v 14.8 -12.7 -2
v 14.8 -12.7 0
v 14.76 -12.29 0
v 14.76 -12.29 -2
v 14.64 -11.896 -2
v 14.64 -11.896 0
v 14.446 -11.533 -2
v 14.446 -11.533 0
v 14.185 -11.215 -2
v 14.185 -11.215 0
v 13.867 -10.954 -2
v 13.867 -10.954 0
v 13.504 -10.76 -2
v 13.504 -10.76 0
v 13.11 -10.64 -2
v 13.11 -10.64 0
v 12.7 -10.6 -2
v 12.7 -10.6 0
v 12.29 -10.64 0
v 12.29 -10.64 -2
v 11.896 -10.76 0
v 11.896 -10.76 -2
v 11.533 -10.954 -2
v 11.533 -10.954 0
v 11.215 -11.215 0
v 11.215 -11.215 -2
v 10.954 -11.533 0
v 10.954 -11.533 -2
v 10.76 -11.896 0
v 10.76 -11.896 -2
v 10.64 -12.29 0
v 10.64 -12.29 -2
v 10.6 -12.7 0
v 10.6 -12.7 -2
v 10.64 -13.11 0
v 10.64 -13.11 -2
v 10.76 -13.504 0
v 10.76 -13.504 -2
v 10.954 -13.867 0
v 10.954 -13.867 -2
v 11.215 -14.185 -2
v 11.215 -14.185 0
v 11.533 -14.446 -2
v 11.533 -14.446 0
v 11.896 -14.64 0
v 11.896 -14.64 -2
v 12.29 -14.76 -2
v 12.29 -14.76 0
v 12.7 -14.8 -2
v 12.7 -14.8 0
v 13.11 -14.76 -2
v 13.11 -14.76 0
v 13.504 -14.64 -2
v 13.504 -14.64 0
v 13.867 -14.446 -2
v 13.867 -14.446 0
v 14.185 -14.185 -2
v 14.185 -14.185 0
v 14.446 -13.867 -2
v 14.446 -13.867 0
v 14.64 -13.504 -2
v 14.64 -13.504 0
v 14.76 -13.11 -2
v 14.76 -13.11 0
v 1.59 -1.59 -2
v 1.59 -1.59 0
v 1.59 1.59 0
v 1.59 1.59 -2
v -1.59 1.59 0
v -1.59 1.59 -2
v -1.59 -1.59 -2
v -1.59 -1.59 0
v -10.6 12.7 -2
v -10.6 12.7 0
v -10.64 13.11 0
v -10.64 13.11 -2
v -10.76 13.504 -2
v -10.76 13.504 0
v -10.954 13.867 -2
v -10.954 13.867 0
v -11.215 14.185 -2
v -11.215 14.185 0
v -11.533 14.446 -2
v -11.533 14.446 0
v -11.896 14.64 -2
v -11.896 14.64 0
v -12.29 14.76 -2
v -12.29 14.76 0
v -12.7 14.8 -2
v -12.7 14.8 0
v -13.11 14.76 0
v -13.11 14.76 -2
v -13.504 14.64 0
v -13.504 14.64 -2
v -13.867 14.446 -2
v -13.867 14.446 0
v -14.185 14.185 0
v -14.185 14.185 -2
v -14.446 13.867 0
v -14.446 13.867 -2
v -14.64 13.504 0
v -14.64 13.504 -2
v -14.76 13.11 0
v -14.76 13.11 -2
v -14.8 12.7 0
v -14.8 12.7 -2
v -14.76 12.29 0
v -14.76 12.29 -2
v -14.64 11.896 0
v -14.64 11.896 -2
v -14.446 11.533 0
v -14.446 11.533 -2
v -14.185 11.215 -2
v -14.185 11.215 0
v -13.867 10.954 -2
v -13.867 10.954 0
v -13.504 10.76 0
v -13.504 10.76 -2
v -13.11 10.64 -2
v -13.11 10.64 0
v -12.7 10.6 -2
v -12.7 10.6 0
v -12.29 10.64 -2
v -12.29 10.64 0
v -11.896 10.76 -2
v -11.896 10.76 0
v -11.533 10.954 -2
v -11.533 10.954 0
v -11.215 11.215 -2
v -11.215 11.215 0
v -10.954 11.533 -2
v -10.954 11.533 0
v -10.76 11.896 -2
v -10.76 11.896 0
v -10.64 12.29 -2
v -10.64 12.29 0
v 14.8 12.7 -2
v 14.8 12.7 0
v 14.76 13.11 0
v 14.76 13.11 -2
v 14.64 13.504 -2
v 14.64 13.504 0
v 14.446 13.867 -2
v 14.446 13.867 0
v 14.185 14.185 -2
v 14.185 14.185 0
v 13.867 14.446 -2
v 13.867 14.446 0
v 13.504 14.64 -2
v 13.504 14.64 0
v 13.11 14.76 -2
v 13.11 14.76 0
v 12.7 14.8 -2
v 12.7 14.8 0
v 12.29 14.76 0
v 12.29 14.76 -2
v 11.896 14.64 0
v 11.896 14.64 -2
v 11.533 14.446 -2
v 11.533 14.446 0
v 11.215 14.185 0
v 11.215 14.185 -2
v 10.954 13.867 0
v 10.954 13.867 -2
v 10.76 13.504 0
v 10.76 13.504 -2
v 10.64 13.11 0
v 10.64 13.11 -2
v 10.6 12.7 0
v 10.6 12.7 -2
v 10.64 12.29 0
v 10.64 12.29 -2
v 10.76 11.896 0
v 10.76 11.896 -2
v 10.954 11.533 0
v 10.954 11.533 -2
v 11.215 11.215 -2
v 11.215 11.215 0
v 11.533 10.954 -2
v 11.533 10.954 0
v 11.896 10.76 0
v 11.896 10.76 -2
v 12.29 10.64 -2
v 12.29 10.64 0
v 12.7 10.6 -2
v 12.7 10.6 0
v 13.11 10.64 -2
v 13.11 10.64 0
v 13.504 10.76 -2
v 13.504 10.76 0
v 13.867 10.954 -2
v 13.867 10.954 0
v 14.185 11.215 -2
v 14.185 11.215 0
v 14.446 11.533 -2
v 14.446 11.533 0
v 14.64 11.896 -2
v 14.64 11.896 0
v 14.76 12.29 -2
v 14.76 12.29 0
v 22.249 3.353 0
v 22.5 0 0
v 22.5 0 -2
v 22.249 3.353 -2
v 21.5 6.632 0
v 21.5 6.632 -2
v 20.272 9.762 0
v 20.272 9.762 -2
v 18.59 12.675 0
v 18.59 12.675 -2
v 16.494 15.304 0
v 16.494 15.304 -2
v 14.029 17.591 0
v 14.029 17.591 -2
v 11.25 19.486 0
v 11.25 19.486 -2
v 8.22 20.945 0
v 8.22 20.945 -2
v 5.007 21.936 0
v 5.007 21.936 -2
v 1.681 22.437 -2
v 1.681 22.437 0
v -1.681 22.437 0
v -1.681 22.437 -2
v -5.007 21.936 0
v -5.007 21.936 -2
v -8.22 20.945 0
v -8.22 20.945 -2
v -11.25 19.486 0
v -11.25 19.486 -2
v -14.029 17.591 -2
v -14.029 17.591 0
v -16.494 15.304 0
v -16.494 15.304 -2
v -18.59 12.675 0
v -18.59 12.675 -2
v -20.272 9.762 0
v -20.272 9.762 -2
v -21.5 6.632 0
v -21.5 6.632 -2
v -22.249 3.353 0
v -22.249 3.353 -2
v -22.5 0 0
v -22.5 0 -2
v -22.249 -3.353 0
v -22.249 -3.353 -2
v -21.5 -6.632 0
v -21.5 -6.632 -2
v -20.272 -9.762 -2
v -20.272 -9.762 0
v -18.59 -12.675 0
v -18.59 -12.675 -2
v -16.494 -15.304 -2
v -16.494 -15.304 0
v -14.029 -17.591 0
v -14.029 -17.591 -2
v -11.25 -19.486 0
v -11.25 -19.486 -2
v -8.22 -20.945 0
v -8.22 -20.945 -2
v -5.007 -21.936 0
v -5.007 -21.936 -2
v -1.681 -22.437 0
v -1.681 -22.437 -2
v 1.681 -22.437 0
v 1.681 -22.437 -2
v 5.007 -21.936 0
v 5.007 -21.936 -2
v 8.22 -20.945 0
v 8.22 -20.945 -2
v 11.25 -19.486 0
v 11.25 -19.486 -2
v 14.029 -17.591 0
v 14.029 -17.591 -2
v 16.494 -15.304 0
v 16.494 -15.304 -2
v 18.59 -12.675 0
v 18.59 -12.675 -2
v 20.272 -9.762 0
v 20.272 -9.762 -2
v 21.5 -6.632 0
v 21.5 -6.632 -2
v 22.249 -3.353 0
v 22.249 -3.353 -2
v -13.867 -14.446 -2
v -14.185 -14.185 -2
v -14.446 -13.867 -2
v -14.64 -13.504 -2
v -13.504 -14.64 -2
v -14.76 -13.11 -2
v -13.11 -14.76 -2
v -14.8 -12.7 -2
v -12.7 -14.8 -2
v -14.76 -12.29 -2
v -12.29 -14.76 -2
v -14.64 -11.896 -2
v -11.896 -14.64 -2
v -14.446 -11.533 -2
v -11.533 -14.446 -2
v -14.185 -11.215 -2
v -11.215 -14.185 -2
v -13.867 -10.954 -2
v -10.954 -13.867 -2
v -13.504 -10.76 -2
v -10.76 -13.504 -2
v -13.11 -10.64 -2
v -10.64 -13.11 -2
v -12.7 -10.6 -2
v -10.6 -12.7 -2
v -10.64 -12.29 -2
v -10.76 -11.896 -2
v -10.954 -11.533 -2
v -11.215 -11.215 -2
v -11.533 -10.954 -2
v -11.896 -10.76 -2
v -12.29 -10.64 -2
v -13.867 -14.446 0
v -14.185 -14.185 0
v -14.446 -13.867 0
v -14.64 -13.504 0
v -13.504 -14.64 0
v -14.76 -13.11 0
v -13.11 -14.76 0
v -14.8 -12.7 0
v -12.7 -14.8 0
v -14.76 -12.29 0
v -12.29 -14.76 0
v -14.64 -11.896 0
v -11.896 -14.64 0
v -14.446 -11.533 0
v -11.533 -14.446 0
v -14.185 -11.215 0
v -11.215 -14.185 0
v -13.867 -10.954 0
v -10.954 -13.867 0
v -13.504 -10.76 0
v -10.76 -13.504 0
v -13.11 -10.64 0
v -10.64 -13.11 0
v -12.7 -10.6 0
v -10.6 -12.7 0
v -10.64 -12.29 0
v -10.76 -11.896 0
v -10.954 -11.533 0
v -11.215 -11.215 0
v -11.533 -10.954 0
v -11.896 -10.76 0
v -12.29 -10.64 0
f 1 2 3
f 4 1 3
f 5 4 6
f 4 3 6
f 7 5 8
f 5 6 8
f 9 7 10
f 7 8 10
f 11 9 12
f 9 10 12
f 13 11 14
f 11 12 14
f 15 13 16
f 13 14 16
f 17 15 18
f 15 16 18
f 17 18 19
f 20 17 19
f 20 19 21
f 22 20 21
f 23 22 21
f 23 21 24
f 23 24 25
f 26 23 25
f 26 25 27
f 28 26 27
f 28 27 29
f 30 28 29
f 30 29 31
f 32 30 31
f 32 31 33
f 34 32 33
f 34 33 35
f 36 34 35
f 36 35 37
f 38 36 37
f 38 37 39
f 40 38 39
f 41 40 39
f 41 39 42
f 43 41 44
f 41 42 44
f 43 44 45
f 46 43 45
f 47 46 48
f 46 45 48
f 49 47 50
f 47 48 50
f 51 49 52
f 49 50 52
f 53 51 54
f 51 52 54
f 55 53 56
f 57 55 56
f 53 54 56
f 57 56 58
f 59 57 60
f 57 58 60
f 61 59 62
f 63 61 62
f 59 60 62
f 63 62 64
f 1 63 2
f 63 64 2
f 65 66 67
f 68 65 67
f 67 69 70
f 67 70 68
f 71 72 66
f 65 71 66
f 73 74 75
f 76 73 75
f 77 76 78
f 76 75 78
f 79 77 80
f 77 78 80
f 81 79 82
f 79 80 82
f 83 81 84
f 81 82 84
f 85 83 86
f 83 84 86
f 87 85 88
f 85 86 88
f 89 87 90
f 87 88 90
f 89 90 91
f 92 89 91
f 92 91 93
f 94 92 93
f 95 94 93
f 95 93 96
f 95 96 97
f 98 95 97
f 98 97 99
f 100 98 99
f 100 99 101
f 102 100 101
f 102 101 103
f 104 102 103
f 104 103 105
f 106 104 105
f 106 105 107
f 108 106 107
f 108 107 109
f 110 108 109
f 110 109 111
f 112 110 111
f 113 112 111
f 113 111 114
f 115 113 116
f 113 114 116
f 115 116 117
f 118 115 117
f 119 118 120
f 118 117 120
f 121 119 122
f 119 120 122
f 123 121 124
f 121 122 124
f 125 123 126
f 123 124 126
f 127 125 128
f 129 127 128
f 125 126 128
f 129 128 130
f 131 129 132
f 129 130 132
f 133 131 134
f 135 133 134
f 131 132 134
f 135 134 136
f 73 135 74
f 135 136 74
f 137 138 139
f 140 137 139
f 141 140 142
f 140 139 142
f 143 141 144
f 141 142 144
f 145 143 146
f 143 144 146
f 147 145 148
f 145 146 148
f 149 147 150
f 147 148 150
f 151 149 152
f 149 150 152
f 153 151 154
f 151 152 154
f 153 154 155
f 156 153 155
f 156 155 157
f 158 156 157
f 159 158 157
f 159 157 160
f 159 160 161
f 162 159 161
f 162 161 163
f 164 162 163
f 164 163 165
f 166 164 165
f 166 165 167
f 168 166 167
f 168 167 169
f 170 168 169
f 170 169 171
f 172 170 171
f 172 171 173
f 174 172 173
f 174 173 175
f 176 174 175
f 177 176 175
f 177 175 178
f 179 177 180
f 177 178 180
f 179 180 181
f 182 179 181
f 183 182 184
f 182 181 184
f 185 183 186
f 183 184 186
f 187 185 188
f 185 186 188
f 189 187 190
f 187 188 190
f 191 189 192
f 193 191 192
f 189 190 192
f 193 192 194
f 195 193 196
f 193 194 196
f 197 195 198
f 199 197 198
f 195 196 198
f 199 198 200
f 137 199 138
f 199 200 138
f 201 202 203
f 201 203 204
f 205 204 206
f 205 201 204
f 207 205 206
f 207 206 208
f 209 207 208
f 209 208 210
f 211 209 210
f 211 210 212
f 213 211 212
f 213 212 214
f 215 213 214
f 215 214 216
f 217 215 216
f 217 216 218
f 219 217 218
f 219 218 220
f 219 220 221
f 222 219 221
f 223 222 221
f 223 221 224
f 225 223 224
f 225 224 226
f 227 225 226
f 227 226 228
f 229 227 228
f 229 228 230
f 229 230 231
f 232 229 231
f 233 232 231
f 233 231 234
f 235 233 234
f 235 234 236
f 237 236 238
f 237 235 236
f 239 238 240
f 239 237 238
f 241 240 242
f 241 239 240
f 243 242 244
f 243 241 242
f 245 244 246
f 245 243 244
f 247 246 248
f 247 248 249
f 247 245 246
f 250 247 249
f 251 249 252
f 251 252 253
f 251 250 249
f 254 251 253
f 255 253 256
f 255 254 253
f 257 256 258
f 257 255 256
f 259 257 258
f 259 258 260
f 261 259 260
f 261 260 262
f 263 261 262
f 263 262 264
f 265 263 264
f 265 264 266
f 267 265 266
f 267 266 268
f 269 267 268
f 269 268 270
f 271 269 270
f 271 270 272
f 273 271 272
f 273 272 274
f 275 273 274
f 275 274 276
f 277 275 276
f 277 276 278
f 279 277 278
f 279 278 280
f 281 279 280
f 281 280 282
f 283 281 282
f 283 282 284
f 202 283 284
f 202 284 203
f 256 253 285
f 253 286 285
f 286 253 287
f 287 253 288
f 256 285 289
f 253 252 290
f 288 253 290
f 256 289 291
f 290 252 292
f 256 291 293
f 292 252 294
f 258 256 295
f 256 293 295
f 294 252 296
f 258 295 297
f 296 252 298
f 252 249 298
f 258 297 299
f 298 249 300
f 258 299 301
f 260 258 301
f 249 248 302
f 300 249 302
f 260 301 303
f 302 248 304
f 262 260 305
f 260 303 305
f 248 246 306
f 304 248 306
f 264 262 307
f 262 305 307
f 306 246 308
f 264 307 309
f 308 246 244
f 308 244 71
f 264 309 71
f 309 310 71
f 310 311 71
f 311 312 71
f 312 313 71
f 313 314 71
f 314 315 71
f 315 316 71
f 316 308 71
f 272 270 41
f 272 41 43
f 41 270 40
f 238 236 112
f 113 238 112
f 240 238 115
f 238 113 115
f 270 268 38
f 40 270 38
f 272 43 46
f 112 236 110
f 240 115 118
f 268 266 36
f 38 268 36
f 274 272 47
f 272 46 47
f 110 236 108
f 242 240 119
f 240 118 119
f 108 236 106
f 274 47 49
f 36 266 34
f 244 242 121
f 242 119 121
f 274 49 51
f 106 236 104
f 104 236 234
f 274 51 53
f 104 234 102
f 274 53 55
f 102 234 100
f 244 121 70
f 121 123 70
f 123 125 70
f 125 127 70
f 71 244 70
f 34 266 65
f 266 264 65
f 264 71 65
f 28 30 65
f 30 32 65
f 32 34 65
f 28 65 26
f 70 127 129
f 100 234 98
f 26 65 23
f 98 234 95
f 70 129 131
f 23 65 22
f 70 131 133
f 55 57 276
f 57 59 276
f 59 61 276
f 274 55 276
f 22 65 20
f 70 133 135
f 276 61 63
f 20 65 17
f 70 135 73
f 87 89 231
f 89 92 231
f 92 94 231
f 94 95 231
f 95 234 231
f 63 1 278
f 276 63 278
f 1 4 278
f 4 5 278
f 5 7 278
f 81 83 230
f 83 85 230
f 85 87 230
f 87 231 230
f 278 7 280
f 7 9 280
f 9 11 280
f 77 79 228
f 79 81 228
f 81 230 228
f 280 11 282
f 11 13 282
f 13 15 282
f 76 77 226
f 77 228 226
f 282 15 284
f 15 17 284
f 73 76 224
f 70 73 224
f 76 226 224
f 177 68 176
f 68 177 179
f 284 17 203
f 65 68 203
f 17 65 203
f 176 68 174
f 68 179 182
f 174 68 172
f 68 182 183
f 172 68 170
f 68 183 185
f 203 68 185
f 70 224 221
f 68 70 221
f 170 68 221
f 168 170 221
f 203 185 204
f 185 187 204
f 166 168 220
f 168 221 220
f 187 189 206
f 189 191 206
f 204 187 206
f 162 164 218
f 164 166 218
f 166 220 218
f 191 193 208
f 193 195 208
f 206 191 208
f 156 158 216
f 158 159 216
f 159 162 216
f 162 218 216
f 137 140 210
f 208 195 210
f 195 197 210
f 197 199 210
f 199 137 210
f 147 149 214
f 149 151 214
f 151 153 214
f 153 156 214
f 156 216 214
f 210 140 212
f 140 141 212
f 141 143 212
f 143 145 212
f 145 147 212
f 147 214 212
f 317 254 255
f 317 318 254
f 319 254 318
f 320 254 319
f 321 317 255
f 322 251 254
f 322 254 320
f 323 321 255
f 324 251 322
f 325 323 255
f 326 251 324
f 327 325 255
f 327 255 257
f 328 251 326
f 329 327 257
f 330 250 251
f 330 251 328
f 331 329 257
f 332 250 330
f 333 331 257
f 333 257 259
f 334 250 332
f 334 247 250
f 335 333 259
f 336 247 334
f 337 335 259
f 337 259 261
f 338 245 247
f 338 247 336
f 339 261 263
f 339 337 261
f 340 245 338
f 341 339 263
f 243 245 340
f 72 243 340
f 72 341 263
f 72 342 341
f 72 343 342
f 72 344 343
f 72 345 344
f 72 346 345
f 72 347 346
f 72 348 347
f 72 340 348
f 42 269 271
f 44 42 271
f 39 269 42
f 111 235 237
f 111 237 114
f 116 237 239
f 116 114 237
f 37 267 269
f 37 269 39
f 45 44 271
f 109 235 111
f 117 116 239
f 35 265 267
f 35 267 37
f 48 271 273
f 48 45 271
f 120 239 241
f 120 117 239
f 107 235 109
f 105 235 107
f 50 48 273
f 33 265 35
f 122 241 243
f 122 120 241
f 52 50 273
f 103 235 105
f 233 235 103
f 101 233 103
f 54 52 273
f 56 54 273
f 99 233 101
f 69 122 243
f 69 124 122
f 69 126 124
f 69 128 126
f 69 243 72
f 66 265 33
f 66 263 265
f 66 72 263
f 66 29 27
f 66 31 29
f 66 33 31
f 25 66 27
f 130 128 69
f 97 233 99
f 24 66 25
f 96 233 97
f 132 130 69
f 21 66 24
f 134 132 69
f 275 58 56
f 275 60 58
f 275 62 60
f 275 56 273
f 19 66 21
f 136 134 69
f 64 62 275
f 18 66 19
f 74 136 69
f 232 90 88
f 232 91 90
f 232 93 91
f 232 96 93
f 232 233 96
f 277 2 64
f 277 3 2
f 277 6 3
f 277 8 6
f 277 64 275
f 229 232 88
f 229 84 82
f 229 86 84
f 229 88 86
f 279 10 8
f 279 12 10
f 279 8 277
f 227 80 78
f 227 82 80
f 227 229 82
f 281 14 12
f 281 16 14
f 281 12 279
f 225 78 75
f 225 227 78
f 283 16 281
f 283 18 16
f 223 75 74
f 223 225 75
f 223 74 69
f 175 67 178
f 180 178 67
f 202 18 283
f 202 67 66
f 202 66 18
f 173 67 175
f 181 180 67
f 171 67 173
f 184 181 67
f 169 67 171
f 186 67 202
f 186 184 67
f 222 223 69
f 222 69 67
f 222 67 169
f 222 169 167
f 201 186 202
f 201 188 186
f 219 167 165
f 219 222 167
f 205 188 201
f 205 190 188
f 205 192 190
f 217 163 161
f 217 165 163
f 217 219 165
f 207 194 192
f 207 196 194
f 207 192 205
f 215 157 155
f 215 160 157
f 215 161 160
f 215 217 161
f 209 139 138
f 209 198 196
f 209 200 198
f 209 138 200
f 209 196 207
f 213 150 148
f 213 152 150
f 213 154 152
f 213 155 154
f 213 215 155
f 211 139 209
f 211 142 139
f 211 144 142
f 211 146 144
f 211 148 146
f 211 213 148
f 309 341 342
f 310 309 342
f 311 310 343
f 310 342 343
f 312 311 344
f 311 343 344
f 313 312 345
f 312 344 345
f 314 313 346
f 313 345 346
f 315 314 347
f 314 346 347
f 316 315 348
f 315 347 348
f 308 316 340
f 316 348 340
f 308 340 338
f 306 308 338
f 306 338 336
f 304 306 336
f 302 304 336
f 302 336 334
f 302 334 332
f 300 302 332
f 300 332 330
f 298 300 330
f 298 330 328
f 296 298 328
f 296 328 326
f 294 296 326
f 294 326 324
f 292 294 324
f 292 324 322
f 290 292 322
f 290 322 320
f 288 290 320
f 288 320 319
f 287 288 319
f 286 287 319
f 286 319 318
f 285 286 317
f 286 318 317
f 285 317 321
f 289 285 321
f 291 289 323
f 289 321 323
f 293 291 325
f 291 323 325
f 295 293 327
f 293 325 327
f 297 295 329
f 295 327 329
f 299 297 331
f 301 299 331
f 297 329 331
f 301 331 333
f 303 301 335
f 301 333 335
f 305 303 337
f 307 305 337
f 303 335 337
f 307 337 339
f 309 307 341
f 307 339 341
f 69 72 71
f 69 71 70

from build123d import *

# Parameters (mm, degrees)
SKETCH1_R          = 24
BASE_FLANGE1_DEPTH = 2
SKETCH6_R          = 2.1
SKETCH6_W          = 3.18
SKETCH6_H          = 3.18
CUT_EXTRUDE1_DEPTH = 10
SKETCH8_R          = 24
SKETCH8_R_2        = 22.5
CUT_EXTRUDE3_DEPTH = 10


# Sheet-metal steps are written as plain solids
with BuildPart() as part:
    # Sketch1 → Base-Flange1 (new body)
    with BuildSketch(Plane.XY):
        Circle(SKETCH1_R)
    extrude(amount=-BASE_FLANGE1_DEPTH)

    # Sketch6 → Cut-Extrude1 (cut)
    with BuildSketch(Plane.XY):
        with Locations((-12.7, 12.7)):
            Circle(SKETCH6_R)
        with Locations((12.7, 12.7)):
            Circle(SKETCH6_R)
        with Locations((12.7, -12.7)):
            Circle(SKETCH6_R)
        with Locations((-12.7, -12.7)):
            Circle(SKETCH6_R)
        Rectangle(SKETCH6_W, SKETCH6_H)
    extrude(amount=-CUT_EXTRUDE1_DEPTH, mode=Mode.SUBTRACT)

    # Sketch8 → Cut-Extrude3 (cut)
    with BuildSketch(Plane.XY):
        Circle(SKETCH8_R)
        Circle(SKETCH8_R_2, mode=Mode.SUBTRACT)
    extrude(amount=-CUT_EXTRUDE3_DEPTH, mode=Mode.SUBTRACT)


solid = part.part
